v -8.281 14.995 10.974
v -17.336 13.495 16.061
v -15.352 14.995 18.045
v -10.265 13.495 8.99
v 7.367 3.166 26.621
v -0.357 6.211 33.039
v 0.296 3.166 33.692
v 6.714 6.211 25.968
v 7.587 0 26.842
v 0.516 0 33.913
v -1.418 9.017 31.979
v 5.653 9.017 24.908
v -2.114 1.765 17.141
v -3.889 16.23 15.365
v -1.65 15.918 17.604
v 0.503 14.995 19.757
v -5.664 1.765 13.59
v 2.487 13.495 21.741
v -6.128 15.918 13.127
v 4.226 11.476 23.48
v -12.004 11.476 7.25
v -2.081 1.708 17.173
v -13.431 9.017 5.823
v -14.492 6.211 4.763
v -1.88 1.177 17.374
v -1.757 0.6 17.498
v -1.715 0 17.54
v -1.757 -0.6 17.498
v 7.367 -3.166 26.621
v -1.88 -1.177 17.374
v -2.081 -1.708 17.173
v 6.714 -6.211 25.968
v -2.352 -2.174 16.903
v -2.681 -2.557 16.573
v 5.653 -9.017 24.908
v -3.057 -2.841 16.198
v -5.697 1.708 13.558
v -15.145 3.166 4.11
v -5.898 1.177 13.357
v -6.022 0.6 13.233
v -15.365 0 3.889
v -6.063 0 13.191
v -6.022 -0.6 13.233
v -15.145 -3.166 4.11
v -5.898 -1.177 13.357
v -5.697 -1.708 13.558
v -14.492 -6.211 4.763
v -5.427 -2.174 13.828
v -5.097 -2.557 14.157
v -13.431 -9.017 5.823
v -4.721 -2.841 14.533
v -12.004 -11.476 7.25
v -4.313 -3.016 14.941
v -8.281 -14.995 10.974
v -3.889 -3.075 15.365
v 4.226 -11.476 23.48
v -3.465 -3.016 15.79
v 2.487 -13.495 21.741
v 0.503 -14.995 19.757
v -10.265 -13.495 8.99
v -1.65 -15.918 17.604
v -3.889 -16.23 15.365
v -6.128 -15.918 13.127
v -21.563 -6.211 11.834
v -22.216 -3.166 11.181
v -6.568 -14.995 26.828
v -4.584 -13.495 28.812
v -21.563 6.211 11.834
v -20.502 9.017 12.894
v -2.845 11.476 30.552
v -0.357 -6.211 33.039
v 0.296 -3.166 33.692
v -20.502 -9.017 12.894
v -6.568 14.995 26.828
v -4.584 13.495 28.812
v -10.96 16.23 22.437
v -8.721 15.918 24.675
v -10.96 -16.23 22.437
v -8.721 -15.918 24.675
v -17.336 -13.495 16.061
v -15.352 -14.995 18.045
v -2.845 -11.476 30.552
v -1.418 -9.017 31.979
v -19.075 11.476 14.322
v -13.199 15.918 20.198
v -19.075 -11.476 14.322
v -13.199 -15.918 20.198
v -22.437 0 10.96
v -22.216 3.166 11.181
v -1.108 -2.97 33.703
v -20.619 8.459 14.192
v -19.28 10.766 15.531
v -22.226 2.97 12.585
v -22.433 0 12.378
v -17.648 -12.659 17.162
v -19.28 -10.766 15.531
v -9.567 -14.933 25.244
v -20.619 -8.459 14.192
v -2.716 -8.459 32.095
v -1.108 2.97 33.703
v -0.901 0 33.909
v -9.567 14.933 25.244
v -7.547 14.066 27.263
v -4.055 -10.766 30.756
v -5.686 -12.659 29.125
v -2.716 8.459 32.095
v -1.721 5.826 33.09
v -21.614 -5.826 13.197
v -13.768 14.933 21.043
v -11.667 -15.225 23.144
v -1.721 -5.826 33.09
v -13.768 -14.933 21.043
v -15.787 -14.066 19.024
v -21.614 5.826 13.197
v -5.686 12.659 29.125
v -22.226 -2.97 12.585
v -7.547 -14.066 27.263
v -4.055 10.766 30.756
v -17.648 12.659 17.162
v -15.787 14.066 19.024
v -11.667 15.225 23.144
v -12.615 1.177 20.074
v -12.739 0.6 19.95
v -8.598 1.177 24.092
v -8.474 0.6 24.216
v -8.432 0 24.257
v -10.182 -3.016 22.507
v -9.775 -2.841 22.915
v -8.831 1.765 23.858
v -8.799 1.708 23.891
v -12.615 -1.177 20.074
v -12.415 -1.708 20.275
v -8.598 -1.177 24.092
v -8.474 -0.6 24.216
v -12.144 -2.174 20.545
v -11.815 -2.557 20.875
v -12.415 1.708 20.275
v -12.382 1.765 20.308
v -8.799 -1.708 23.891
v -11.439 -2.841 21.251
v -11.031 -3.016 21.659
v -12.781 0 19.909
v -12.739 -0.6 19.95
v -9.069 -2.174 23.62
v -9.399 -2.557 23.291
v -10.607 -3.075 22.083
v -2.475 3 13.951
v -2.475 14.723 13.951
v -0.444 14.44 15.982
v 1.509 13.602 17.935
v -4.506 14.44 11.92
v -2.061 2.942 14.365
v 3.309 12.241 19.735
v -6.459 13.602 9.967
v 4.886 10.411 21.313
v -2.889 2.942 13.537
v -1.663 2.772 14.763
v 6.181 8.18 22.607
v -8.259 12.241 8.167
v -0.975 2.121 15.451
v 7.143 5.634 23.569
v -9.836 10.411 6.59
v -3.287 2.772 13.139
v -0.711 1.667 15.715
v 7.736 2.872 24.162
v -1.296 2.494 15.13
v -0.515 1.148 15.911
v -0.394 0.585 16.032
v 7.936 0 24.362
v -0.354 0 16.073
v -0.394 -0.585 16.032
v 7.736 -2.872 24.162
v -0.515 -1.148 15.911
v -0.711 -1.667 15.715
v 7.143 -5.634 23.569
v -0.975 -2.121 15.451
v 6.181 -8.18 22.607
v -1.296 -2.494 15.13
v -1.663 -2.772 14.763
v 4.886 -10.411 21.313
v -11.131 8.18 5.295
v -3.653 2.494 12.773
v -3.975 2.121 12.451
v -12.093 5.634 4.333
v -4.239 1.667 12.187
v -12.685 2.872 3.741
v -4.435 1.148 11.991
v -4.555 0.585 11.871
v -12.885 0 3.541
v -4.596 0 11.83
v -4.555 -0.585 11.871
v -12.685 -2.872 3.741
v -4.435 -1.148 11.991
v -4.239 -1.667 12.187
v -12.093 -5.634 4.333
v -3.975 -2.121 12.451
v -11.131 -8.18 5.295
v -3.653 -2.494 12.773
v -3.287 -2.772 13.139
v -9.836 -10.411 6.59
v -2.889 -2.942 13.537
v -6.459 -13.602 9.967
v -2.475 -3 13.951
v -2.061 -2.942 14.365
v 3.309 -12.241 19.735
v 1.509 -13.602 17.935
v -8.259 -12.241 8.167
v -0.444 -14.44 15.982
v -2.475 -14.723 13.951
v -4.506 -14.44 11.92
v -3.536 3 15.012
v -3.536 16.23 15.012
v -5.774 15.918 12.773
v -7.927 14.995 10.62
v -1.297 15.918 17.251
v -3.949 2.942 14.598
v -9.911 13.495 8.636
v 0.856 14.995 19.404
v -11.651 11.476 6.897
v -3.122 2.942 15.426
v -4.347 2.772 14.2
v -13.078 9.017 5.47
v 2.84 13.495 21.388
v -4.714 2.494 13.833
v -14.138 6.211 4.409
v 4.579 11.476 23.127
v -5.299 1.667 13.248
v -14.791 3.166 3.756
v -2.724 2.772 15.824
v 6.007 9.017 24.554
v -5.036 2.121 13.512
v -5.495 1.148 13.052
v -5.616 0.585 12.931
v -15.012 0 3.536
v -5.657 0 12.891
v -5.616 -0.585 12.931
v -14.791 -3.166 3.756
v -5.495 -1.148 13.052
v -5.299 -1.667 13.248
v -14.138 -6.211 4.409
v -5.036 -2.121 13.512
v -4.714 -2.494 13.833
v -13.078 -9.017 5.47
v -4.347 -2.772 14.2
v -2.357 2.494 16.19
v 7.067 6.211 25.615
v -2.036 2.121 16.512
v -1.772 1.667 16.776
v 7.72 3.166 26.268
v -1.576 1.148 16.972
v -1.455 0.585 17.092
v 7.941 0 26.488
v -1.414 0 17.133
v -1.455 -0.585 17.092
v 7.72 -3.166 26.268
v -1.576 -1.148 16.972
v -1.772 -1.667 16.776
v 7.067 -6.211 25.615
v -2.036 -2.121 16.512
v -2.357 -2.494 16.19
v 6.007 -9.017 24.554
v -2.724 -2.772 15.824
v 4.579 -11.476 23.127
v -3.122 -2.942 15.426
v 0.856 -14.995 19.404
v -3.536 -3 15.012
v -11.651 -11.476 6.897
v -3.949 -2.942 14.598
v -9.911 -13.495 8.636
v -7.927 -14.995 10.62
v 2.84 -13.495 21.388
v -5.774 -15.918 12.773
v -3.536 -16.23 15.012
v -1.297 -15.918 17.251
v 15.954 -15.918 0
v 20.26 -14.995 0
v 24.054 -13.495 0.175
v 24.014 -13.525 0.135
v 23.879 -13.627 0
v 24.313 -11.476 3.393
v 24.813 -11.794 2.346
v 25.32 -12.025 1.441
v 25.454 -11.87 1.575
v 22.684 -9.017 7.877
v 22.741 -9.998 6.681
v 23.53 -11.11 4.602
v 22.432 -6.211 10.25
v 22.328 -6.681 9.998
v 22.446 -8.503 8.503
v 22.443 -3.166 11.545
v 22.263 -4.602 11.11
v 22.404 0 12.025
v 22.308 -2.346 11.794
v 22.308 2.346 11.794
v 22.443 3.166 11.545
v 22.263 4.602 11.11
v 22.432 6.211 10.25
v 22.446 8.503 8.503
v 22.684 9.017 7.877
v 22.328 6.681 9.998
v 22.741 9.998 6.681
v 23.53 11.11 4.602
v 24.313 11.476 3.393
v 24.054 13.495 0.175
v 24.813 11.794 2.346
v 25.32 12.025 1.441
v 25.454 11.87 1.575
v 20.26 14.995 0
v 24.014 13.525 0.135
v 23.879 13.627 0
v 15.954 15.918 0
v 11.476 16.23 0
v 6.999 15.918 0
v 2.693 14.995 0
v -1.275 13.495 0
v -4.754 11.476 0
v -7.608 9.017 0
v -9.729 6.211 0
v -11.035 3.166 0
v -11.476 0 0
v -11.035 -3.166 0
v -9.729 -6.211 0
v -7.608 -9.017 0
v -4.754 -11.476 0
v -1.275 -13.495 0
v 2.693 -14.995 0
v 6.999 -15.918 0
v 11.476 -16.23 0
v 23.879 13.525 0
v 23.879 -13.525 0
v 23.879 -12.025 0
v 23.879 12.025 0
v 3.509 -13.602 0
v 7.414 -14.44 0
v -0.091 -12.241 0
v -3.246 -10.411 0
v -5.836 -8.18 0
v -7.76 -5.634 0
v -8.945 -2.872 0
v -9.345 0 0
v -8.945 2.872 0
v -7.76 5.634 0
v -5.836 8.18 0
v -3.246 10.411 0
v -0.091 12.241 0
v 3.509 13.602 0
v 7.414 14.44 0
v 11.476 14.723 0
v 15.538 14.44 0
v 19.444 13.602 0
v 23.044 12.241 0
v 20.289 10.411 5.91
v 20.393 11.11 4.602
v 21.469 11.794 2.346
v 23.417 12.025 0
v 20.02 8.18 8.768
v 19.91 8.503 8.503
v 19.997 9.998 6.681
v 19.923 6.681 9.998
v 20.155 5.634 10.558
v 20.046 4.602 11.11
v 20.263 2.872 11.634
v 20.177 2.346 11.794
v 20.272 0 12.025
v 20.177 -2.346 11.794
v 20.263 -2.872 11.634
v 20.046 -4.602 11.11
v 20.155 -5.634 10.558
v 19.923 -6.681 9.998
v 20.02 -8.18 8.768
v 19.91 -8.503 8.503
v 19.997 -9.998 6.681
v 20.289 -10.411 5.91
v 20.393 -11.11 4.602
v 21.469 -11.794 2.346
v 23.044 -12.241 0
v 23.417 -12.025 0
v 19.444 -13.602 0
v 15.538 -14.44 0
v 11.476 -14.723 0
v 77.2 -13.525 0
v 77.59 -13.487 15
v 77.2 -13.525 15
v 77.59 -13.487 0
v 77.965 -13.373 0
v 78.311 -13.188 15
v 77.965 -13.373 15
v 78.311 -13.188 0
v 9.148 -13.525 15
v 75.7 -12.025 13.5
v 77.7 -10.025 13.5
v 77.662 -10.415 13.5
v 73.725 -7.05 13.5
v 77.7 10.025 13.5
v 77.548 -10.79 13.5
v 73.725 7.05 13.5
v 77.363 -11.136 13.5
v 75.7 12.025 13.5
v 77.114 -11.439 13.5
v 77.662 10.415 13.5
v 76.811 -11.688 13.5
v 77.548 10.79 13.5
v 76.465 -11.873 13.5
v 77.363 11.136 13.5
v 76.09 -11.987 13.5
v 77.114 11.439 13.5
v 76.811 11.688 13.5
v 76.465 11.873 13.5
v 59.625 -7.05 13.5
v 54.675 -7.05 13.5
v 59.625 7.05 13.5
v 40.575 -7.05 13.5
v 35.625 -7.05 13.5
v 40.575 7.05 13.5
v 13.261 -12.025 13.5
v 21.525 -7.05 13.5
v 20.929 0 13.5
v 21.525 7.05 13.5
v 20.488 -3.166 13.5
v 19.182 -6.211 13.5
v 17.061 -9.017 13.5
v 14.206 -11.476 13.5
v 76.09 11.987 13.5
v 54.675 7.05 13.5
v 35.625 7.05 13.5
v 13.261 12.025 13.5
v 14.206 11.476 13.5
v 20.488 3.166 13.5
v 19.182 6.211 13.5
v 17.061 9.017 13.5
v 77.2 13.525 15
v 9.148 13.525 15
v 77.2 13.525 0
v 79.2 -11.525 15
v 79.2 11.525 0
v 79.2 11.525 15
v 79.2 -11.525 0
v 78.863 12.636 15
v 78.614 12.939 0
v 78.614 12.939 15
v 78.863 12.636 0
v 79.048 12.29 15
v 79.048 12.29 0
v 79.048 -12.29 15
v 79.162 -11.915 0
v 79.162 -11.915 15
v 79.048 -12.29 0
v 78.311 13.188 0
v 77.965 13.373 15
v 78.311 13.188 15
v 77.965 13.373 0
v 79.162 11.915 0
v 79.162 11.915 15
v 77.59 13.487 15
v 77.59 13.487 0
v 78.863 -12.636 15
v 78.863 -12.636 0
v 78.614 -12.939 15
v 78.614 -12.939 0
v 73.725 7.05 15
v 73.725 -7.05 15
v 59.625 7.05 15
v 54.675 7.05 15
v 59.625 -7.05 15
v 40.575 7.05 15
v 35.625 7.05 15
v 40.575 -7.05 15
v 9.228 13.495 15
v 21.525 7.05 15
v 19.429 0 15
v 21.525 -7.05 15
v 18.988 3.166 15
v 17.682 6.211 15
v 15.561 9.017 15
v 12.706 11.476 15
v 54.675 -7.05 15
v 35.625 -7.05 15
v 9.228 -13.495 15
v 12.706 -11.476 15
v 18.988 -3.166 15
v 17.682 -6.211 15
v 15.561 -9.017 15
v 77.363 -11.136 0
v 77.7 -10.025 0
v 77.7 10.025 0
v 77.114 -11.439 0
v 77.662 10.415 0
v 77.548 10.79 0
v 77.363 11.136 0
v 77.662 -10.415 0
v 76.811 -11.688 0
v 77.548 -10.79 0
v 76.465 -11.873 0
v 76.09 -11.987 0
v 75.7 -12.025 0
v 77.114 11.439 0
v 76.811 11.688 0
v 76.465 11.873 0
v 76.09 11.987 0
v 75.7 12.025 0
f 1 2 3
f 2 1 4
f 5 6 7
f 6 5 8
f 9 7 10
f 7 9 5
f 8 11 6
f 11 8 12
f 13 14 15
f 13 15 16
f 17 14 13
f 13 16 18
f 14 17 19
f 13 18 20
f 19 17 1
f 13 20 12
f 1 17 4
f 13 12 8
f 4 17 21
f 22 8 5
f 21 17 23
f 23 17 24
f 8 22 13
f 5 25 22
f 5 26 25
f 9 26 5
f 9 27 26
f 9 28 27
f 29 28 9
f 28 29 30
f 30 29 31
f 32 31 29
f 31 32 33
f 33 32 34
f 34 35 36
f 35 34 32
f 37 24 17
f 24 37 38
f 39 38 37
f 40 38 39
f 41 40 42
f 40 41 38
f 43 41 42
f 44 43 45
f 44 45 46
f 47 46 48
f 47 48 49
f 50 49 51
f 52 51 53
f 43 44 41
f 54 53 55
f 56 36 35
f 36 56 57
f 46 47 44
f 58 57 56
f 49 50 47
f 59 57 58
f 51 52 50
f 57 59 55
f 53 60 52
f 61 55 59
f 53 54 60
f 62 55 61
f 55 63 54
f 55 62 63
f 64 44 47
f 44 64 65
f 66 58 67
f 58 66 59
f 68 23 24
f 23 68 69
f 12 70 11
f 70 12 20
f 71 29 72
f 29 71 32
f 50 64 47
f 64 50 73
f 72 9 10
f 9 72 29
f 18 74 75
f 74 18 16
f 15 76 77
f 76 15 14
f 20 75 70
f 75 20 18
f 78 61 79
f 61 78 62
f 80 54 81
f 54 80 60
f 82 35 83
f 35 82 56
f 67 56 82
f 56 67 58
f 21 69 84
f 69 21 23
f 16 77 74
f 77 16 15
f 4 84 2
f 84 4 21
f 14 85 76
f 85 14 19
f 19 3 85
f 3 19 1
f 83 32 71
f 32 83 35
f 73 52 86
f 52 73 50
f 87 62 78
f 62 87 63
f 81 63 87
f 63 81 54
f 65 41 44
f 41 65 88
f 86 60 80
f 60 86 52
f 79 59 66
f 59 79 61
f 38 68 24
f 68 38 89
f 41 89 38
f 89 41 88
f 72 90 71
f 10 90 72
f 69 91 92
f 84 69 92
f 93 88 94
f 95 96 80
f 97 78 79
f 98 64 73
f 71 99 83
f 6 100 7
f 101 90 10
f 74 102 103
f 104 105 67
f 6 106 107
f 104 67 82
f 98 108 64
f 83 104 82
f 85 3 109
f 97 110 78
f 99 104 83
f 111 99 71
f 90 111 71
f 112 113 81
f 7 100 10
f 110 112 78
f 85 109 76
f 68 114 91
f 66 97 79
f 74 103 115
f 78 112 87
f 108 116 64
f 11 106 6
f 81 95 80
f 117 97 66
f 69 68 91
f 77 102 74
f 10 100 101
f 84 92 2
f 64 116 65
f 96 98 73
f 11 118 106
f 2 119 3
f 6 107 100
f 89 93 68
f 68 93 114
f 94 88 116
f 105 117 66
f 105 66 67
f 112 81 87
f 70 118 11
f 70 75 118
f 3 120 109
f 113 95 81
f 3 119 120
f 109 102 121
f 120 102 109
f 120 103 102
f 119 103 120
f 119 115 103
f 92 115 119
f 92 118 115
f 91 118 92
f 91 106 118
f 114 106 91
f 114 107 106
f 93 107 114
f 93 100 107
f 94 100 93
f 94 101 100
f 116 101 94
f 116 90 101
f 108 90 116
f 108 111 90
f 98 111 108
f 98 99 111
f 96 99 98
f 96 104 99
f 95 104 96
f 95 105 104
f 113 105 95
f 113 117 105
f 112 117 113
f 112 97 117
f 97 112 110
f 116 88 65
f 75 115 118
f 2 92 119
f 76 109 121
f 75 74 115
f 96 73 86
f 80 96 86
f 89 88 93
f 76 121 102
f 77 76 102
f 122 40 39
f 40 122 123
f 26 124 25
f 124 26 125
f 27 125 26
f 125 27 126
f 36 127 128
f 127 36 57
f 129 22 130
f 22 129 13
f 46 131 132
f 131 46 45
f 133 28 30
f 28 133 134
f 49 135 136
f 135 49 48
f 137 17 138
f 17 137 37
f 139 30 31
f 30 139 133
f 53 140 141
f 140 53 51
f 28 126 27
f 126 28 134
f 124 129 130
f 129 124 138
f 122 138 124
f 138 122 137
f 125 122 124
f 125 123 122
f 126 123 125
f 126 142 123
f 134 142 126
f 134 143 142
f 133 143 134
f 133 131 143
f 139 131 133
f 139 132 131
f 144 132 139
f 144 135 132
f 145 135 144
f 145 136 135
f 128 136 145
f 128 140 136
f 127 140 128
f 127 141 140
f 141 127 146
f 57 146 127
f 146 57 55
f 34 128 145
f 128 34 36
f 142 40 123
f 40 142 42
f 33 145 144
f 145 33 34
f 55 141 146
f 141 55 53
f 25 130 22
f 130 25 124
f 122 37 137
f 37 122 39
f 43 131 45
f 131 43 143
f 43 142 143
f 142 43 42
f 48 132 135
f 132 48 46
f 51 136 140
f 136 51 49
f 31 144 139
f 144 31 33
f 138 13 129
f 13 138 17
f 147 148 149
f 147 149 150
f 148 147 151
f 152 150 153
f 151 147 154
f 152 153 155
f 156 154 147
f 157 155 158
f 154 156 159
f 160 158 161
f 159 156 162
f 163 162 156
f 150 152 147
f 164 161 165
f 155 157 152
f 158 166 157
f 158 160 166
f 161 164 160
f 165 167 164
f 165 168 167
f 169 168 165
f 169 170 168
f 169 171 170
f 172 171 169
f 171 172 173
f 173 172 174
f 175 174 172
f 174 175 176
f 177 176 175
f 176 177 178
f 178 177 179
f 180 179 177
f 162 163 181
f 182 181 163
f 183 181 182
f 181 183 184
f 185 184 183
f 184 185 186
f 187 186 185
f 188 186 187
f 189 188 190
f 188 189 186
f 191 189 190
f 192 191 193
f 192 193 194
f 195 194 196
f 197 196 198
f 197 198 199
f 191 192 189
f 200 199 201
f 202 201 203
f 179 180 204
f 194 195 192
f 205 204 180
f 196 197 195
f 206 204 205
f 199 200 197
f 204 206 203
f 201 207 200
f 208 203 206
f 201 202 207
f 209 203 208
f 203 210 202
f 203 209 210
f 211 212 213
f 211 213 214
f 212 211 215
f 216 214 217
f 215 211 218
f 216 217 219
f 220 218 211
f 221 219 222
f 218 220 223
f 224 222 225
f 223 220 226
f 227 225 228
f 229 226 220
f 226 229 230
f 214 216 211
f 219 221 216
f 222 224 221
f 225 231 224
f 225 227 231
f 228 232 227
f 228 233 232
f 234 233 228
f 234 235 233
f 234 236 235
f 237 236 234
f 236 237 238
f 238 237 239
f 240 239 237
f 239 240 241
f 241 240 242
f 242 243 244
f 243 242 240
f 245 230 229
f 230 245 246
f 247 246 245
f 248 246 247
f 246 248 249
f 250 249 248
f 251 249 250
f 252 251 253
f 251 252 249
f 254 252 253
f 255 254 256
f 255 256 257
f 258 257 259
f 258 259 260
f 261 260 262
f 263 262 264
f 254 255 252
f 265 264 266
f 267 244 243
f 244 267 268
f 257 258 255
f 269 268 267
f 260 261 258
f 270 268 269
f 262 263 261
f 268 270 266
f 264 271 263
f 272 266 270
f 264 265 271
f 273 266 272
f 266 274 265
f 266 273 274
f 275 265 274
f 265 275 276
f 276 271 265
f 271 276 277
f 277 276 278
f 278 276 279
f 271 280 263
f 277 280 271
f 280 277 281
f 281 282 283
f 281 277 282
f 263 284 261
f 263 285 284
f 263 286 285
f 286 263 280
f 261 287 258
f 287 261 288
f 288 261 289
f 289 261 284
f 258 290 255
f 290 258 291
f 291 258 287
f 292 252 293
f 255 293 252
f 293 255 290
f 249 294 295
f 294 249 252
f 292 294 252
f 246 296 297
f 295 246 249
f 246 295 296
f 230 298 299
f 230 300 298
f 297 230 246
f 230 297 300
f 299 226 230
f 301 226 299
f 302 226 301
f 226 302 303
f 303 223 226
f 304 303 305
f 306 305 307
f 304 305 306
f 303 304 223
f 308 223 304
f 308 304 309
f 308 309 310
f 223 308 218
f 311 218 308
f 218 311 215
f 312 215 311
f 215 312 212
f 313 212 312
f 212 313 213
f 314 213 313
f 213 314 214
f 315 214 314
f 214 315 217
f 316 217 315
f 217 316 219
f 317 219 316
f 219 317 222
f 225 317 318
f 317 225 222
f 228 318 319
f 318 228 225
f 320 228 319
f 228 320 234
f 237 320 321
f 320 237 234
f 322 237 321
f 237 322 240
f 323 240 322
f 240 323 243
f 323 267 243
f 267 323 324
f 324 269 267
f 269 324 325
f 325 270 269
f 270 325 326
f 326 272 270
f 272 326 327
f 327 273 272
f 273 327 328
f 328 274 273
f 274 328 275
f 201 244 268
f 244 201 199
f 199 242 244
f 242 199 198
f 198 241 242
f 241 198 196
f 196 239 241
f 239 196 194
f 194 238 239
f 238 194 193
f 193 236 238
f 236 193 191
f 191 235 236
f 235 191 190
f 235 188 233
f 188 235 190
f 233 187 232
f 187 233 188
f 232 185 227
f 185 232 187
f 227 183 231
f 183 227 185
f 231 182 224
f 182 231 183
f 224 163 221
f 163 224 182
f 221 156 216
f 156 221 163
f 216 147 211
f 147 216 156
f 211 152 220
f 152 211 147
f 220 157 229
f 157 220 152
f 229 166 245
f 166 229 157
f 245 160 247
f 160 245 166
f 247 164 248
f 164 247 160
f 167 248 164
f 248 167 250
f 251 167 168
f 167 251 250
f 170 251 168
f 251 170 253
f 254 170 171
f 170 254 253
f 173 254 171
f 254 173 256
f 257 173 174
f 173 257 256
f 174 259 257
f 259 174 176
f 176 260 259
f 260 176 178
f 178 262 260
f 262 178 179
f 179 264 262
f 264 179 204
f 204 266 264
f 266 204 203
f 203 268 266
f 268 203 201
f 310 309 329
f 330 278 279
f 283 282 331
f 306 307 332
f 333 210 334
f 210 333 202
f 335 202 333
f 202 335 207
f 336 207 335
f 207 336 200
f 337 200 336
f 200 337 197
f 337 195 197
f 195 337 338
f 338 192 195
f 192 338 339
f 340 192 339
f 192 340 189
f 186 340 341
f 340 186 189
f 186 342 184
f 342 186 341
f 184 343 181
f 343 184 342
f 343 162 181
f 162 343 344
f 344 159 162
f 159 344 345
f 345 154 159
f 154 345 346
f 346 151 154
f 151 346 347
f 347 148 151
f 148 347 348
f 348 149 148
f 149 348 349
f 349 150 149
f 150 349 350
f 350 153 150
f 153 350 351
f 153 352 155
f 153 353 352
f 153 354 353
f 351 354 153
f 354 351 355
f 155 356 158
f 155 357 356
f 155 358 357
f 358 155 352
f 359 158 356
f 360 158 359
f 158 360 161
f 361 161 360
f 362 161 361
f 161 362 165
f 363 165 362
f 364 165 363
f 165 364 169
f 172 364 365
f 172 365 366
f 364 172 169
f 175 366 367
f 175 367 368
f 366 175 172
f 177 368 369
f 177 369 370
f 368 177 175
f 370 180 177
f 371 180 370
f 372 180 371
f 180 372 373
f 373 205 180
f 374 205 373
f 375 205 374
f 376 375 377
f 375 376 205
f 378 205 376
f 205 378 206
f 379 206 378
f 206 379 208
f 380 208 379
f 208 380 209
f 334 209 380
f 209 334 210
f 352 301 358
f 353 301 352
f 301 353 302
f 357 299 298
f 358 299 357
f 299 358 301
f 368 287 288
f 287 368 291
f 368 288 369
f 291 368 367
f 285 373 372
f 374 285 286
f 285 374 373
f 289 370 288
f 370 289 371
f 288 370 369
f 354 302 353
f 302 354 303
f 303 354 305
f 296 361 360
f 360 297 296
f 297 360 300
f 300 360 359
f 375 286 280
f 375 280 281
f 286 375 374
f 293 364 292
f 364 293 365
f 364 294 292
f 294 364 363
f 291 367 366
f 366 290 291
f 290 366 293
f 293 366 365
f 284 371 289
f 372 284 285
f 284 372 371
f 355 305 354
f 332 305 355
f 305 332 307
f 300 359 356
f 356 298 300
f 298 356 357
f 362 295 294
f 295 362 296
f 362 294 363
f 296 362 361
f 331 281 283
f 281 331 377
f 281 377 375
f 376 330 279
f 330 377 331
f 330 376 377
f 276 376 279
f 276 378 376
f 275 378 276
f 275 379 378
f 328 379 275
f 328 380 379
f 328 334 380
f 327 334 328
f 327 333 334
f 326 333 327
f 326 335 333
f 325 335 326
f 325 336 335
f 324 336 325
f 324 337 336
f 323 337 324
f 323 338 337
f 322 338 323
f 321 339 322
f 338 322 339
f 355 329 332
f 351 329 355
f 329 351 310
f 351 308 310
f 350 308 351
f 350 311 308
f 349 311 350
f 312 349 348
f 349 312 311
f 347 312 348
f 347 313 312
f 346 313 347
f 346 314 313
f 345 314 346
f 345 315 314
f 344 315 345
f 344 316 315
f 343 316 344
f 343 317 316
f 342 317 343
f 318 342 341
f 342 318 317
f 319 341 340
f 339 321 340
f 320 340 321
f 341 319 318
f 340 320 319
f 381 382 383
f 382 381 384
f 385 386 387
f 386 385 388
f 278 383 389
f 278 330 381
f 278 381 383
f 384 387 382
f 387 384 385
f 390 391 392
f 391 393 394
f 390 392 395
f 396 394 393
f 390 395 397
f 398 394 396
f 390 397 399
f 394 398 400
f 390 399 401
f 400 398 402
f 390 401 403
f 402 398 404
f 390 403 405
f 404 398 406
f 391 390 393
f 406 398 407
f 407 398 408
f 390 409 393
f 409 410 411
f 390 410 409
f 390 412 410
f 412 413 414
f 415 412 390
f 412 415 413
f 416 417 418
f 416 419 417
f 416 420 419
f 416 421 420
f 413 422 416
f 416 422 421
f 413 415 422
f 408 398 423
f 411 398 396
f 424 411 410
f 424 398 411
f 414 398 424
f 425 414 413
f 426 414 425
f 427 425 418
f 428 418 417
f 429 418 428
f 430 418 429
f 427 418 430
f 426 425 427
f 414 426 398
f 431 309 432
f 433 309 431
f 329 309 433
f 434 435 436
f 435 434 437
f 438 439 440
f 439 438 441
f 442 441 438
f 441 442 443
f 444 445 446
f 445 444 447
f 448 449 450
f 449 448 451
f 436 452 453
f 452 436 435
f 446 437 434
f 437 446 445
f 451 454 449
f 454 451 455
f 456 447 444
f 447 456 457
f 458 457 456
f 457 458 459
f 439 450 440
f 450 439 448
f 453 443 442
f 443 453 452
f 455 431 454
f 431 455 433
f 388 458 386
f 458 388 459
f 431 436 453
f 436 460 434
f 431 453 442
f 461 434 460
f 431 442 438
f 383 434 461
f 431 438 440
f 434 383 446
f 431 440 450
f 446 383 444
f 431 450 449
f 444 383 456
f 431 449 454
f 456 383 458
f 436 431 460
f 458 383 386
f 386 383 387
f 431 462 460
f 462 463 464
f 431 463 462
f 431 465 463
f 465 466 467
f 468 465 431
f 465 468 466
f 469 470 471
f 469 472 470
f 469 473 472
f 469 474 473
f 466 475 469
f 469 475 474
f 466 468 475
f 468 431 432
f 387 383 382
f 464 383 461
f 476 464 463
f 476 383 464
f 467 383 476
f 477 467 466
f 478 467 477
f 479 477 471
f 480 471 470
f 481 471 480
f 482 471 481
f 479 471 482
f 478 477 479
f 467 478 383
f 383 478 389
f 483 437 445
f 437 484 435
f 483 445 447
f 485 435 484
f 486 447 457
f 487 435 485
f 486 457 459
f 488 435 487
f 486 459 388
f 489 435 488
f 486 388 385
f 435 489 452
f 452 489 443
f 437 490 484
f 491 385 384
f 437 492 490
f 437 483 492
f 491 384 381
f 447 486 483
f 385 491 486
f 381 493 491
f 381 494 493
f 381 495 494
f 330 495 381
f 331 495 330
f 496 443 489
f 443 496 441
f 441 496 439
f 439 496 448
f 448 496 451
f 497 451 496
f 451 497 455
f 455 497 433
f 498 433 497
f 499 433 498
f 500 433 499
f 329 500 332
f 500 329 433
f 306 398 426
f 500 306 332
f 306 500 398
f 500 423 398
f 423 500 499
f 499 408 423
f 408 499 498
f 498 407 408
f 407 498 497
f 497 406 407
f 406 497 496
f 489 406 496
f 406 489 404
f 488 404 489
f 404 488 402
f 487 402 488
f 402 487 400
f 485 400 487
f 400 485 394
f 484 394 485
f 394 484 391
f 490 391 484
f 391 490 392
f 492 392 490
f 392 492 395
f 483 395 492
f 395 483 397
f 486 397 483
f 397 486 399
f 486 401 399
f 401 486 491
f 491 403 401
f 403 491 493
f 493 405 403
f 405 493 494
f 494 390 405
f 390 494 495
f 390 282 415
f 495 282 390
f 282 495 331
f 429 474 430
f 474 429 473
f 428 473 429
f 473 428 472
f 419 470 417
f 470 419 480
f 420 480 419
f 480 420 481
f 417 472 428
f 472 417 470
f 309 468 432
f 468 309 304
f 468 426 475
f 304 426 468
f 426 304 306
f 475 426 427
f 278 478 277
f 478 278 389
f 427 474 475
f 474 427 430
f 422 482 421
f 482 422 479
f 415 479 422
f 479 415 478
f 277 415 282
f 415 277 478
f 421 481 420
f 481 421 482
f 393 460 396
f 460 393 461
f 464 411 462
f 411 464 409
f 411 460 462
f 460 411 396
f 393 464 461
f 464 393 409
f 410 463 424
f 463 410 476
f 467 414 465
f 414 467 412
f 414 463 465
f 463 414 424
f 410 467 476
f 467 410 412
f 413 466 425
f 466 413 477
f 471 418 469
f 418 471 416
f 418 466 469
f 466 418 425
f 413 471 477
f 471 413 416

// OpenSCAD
$fn = 32;
thin = 0.00001;
border_radius = 2;
// See https://matt3o.com/anatomy-of-a-keyboard/
switch_hole_size = 14;
switch_distance_between_holes = 5.05;
keycap_placeholder_space = switch_hole_size + switch_distance_between_holes;
switch_tolerance = 0.1;

wall_thickness = 1.5;

x_size = keycap_placeholder_space * 4;
y_size = keycap_placeholder_space + 5;
h_size = 15;
body_base_x = x_size + wall_thickness * 2;
body_base_y = y_size + wall_thickness * 2;

knob_chamfer = 1;
knob_oversized_by = (1 / 5) * body_base_y;
knob_radius = (body_base_y / 2) + knob_oversized_by / 2;
knob_height = 11;
knob_elevation = 5;
knob_rotation = [ 0, -45, 0 ];

shaft_height = 10.20;
shaft_radius = 3;
shaft_tolerance = 0.075;

module cut()
{
    h = 100;
    x = 200;
    y = 50;
    translate([ 0, -y / 2, 0 ]) cube([ x, y, h ], true);
}

module table()
{
    h = 25;
    x = 100;
    y = 100;
    translate([ 0, 0, -h / 2 ]) cube([ x, y, h ], true);
}

module rotary_encoder()
{
    translate([ 0, 0, -10 ])
    {
        translate([ 0, 0, 5 ]) cube([ 12, 12, 10 ], center = true);
        translate([ 0, 0, 10 ]) cylinder(7, r = 7 / 2);
        translate([ 0, 0, 10 + 7 ]) cylinder(12.5, r = 6 / 2);
    }
}

module knob()
{
    translate([ 0, 0, 0.5 + knob_elevation ])
    {
        difference()
        {
            union()
            {
                cylinder(h = knob_height - knob_chamfer, r = knob_radius);

                translate([ 0, 0, knob_height - knob_chamfer ]) hull()
                {
                    linear_extrude(height = thin) circle(r = knob_radius);
                    translate([ 0, 0, knob_chamfer ]) linear_extrude(height = thin) offset(delta = -knob_chamfer)
                        circle(r = knob_radius);
                }
            }

            difference()
            {
                cylinder(h = knob_height - wall_thickness, r = shaft_radius + shaft_tolerance);
                translate([ -shaft_radius, shaft_radius / 1.7, 0 ]) cube([ shaft_radius * 2, 10, shaft_height ]);
            }
        }
    }
}

module knob_base()
{
    h = 25;

    translate([ 0, 0, -h ])
    {
        translate([ 0, 0, h + knob_elevation - wall_thickness ]) linear_extrude(height = wall_thickness) difference()
        {
            circle(r = knob_radius);
            circle(r = shaft_radius);
        }
        linear_extrude(height = knob_elevation + h) difference()
        {
            circle(r = knob_radius);
            offset(delta = -wall_thickness) circle(r = knob_radius);
        }
    }
}

module knob_assembly()
{
    difference()
    {
        translate([ 0, 0, knob_radius / sqrt(2) ]) rotate(knob_rotation)
        {
            // translate([ 0, 0, knob_elevation - wall_thickness ]) color([ 0, 0, 1, 0.8 ]) rotary_encoder();
            knob();
            knob_base();
        }

        // hole for body

        color("red") translate([ knob_radius / sqrt(2), 0, 0 ]) rotate([ 0, 90, 0 ])
            cylinder(h = x_size / 2, r = y_size / 2);
        table();
    }
}

module body()
{
    difference()
    {
        translate([ body_base_x / 2, 0, 0 ])
        {
            body_base_x_corrected = body_base_x - (border_radius * 2);
            body_base_y_corrected = body_base_y - (border_radius * 2);

            color("blue") translate([ 0, 0, h_size - wall_thickness ]) linear_extrude(height = wall_thickness)
                offset(r = border_radius) square([ body_base_x_corrected, body_base_y_corrected ], center = true);

            linear_extrude(height = h_size - wall_thickness) difference()
            {
                offset(r = border_radius) square([ body_base_x_corrected, body_base_y_corrected ], center = true);
                offset(r = border_radius) offset(delta = -wall_thickness)
                    square([ body_base_x_corrected, body_base_y_corrected ], center = true);
            }
        }

        // hole for knob_base
        h = 50;
        translate([ 0, 0, knob_radius / sqrt(2) ]) rotate(knob_rotation)
        {
            cylinder(h = h, r = knob_radius, center = true);
            translate([ -knob_radius / 2, 0, 0 ]) cube(size = [ knob_radius, knob_radius * 2, h ], center = true);
        }

        // switch holes
        for (column = [0:3 - 1])
        {
            translate([ x_size - column * keycap_placeholder_space - keycap_placeholder_space / 2, 0, h_size ])
                cube(switch_hole_size + switch_tolerance, center = true);
        }
    }
}

module main()
{
    difference()
    {
        union()
        {
            knob_assembly();
            body();
        }

        // difference()
        // {
        // translate([ body_base_x / 2, 0, (h_size - wall_thickness) / 2 ])
        //     cube([ body_base_x - wall_thickness * 2, body_base_y - wall_thickness * 2, h_size - wall_thickness ],
        //          center = true);
        // }
        // cut();
    }
}

main();
